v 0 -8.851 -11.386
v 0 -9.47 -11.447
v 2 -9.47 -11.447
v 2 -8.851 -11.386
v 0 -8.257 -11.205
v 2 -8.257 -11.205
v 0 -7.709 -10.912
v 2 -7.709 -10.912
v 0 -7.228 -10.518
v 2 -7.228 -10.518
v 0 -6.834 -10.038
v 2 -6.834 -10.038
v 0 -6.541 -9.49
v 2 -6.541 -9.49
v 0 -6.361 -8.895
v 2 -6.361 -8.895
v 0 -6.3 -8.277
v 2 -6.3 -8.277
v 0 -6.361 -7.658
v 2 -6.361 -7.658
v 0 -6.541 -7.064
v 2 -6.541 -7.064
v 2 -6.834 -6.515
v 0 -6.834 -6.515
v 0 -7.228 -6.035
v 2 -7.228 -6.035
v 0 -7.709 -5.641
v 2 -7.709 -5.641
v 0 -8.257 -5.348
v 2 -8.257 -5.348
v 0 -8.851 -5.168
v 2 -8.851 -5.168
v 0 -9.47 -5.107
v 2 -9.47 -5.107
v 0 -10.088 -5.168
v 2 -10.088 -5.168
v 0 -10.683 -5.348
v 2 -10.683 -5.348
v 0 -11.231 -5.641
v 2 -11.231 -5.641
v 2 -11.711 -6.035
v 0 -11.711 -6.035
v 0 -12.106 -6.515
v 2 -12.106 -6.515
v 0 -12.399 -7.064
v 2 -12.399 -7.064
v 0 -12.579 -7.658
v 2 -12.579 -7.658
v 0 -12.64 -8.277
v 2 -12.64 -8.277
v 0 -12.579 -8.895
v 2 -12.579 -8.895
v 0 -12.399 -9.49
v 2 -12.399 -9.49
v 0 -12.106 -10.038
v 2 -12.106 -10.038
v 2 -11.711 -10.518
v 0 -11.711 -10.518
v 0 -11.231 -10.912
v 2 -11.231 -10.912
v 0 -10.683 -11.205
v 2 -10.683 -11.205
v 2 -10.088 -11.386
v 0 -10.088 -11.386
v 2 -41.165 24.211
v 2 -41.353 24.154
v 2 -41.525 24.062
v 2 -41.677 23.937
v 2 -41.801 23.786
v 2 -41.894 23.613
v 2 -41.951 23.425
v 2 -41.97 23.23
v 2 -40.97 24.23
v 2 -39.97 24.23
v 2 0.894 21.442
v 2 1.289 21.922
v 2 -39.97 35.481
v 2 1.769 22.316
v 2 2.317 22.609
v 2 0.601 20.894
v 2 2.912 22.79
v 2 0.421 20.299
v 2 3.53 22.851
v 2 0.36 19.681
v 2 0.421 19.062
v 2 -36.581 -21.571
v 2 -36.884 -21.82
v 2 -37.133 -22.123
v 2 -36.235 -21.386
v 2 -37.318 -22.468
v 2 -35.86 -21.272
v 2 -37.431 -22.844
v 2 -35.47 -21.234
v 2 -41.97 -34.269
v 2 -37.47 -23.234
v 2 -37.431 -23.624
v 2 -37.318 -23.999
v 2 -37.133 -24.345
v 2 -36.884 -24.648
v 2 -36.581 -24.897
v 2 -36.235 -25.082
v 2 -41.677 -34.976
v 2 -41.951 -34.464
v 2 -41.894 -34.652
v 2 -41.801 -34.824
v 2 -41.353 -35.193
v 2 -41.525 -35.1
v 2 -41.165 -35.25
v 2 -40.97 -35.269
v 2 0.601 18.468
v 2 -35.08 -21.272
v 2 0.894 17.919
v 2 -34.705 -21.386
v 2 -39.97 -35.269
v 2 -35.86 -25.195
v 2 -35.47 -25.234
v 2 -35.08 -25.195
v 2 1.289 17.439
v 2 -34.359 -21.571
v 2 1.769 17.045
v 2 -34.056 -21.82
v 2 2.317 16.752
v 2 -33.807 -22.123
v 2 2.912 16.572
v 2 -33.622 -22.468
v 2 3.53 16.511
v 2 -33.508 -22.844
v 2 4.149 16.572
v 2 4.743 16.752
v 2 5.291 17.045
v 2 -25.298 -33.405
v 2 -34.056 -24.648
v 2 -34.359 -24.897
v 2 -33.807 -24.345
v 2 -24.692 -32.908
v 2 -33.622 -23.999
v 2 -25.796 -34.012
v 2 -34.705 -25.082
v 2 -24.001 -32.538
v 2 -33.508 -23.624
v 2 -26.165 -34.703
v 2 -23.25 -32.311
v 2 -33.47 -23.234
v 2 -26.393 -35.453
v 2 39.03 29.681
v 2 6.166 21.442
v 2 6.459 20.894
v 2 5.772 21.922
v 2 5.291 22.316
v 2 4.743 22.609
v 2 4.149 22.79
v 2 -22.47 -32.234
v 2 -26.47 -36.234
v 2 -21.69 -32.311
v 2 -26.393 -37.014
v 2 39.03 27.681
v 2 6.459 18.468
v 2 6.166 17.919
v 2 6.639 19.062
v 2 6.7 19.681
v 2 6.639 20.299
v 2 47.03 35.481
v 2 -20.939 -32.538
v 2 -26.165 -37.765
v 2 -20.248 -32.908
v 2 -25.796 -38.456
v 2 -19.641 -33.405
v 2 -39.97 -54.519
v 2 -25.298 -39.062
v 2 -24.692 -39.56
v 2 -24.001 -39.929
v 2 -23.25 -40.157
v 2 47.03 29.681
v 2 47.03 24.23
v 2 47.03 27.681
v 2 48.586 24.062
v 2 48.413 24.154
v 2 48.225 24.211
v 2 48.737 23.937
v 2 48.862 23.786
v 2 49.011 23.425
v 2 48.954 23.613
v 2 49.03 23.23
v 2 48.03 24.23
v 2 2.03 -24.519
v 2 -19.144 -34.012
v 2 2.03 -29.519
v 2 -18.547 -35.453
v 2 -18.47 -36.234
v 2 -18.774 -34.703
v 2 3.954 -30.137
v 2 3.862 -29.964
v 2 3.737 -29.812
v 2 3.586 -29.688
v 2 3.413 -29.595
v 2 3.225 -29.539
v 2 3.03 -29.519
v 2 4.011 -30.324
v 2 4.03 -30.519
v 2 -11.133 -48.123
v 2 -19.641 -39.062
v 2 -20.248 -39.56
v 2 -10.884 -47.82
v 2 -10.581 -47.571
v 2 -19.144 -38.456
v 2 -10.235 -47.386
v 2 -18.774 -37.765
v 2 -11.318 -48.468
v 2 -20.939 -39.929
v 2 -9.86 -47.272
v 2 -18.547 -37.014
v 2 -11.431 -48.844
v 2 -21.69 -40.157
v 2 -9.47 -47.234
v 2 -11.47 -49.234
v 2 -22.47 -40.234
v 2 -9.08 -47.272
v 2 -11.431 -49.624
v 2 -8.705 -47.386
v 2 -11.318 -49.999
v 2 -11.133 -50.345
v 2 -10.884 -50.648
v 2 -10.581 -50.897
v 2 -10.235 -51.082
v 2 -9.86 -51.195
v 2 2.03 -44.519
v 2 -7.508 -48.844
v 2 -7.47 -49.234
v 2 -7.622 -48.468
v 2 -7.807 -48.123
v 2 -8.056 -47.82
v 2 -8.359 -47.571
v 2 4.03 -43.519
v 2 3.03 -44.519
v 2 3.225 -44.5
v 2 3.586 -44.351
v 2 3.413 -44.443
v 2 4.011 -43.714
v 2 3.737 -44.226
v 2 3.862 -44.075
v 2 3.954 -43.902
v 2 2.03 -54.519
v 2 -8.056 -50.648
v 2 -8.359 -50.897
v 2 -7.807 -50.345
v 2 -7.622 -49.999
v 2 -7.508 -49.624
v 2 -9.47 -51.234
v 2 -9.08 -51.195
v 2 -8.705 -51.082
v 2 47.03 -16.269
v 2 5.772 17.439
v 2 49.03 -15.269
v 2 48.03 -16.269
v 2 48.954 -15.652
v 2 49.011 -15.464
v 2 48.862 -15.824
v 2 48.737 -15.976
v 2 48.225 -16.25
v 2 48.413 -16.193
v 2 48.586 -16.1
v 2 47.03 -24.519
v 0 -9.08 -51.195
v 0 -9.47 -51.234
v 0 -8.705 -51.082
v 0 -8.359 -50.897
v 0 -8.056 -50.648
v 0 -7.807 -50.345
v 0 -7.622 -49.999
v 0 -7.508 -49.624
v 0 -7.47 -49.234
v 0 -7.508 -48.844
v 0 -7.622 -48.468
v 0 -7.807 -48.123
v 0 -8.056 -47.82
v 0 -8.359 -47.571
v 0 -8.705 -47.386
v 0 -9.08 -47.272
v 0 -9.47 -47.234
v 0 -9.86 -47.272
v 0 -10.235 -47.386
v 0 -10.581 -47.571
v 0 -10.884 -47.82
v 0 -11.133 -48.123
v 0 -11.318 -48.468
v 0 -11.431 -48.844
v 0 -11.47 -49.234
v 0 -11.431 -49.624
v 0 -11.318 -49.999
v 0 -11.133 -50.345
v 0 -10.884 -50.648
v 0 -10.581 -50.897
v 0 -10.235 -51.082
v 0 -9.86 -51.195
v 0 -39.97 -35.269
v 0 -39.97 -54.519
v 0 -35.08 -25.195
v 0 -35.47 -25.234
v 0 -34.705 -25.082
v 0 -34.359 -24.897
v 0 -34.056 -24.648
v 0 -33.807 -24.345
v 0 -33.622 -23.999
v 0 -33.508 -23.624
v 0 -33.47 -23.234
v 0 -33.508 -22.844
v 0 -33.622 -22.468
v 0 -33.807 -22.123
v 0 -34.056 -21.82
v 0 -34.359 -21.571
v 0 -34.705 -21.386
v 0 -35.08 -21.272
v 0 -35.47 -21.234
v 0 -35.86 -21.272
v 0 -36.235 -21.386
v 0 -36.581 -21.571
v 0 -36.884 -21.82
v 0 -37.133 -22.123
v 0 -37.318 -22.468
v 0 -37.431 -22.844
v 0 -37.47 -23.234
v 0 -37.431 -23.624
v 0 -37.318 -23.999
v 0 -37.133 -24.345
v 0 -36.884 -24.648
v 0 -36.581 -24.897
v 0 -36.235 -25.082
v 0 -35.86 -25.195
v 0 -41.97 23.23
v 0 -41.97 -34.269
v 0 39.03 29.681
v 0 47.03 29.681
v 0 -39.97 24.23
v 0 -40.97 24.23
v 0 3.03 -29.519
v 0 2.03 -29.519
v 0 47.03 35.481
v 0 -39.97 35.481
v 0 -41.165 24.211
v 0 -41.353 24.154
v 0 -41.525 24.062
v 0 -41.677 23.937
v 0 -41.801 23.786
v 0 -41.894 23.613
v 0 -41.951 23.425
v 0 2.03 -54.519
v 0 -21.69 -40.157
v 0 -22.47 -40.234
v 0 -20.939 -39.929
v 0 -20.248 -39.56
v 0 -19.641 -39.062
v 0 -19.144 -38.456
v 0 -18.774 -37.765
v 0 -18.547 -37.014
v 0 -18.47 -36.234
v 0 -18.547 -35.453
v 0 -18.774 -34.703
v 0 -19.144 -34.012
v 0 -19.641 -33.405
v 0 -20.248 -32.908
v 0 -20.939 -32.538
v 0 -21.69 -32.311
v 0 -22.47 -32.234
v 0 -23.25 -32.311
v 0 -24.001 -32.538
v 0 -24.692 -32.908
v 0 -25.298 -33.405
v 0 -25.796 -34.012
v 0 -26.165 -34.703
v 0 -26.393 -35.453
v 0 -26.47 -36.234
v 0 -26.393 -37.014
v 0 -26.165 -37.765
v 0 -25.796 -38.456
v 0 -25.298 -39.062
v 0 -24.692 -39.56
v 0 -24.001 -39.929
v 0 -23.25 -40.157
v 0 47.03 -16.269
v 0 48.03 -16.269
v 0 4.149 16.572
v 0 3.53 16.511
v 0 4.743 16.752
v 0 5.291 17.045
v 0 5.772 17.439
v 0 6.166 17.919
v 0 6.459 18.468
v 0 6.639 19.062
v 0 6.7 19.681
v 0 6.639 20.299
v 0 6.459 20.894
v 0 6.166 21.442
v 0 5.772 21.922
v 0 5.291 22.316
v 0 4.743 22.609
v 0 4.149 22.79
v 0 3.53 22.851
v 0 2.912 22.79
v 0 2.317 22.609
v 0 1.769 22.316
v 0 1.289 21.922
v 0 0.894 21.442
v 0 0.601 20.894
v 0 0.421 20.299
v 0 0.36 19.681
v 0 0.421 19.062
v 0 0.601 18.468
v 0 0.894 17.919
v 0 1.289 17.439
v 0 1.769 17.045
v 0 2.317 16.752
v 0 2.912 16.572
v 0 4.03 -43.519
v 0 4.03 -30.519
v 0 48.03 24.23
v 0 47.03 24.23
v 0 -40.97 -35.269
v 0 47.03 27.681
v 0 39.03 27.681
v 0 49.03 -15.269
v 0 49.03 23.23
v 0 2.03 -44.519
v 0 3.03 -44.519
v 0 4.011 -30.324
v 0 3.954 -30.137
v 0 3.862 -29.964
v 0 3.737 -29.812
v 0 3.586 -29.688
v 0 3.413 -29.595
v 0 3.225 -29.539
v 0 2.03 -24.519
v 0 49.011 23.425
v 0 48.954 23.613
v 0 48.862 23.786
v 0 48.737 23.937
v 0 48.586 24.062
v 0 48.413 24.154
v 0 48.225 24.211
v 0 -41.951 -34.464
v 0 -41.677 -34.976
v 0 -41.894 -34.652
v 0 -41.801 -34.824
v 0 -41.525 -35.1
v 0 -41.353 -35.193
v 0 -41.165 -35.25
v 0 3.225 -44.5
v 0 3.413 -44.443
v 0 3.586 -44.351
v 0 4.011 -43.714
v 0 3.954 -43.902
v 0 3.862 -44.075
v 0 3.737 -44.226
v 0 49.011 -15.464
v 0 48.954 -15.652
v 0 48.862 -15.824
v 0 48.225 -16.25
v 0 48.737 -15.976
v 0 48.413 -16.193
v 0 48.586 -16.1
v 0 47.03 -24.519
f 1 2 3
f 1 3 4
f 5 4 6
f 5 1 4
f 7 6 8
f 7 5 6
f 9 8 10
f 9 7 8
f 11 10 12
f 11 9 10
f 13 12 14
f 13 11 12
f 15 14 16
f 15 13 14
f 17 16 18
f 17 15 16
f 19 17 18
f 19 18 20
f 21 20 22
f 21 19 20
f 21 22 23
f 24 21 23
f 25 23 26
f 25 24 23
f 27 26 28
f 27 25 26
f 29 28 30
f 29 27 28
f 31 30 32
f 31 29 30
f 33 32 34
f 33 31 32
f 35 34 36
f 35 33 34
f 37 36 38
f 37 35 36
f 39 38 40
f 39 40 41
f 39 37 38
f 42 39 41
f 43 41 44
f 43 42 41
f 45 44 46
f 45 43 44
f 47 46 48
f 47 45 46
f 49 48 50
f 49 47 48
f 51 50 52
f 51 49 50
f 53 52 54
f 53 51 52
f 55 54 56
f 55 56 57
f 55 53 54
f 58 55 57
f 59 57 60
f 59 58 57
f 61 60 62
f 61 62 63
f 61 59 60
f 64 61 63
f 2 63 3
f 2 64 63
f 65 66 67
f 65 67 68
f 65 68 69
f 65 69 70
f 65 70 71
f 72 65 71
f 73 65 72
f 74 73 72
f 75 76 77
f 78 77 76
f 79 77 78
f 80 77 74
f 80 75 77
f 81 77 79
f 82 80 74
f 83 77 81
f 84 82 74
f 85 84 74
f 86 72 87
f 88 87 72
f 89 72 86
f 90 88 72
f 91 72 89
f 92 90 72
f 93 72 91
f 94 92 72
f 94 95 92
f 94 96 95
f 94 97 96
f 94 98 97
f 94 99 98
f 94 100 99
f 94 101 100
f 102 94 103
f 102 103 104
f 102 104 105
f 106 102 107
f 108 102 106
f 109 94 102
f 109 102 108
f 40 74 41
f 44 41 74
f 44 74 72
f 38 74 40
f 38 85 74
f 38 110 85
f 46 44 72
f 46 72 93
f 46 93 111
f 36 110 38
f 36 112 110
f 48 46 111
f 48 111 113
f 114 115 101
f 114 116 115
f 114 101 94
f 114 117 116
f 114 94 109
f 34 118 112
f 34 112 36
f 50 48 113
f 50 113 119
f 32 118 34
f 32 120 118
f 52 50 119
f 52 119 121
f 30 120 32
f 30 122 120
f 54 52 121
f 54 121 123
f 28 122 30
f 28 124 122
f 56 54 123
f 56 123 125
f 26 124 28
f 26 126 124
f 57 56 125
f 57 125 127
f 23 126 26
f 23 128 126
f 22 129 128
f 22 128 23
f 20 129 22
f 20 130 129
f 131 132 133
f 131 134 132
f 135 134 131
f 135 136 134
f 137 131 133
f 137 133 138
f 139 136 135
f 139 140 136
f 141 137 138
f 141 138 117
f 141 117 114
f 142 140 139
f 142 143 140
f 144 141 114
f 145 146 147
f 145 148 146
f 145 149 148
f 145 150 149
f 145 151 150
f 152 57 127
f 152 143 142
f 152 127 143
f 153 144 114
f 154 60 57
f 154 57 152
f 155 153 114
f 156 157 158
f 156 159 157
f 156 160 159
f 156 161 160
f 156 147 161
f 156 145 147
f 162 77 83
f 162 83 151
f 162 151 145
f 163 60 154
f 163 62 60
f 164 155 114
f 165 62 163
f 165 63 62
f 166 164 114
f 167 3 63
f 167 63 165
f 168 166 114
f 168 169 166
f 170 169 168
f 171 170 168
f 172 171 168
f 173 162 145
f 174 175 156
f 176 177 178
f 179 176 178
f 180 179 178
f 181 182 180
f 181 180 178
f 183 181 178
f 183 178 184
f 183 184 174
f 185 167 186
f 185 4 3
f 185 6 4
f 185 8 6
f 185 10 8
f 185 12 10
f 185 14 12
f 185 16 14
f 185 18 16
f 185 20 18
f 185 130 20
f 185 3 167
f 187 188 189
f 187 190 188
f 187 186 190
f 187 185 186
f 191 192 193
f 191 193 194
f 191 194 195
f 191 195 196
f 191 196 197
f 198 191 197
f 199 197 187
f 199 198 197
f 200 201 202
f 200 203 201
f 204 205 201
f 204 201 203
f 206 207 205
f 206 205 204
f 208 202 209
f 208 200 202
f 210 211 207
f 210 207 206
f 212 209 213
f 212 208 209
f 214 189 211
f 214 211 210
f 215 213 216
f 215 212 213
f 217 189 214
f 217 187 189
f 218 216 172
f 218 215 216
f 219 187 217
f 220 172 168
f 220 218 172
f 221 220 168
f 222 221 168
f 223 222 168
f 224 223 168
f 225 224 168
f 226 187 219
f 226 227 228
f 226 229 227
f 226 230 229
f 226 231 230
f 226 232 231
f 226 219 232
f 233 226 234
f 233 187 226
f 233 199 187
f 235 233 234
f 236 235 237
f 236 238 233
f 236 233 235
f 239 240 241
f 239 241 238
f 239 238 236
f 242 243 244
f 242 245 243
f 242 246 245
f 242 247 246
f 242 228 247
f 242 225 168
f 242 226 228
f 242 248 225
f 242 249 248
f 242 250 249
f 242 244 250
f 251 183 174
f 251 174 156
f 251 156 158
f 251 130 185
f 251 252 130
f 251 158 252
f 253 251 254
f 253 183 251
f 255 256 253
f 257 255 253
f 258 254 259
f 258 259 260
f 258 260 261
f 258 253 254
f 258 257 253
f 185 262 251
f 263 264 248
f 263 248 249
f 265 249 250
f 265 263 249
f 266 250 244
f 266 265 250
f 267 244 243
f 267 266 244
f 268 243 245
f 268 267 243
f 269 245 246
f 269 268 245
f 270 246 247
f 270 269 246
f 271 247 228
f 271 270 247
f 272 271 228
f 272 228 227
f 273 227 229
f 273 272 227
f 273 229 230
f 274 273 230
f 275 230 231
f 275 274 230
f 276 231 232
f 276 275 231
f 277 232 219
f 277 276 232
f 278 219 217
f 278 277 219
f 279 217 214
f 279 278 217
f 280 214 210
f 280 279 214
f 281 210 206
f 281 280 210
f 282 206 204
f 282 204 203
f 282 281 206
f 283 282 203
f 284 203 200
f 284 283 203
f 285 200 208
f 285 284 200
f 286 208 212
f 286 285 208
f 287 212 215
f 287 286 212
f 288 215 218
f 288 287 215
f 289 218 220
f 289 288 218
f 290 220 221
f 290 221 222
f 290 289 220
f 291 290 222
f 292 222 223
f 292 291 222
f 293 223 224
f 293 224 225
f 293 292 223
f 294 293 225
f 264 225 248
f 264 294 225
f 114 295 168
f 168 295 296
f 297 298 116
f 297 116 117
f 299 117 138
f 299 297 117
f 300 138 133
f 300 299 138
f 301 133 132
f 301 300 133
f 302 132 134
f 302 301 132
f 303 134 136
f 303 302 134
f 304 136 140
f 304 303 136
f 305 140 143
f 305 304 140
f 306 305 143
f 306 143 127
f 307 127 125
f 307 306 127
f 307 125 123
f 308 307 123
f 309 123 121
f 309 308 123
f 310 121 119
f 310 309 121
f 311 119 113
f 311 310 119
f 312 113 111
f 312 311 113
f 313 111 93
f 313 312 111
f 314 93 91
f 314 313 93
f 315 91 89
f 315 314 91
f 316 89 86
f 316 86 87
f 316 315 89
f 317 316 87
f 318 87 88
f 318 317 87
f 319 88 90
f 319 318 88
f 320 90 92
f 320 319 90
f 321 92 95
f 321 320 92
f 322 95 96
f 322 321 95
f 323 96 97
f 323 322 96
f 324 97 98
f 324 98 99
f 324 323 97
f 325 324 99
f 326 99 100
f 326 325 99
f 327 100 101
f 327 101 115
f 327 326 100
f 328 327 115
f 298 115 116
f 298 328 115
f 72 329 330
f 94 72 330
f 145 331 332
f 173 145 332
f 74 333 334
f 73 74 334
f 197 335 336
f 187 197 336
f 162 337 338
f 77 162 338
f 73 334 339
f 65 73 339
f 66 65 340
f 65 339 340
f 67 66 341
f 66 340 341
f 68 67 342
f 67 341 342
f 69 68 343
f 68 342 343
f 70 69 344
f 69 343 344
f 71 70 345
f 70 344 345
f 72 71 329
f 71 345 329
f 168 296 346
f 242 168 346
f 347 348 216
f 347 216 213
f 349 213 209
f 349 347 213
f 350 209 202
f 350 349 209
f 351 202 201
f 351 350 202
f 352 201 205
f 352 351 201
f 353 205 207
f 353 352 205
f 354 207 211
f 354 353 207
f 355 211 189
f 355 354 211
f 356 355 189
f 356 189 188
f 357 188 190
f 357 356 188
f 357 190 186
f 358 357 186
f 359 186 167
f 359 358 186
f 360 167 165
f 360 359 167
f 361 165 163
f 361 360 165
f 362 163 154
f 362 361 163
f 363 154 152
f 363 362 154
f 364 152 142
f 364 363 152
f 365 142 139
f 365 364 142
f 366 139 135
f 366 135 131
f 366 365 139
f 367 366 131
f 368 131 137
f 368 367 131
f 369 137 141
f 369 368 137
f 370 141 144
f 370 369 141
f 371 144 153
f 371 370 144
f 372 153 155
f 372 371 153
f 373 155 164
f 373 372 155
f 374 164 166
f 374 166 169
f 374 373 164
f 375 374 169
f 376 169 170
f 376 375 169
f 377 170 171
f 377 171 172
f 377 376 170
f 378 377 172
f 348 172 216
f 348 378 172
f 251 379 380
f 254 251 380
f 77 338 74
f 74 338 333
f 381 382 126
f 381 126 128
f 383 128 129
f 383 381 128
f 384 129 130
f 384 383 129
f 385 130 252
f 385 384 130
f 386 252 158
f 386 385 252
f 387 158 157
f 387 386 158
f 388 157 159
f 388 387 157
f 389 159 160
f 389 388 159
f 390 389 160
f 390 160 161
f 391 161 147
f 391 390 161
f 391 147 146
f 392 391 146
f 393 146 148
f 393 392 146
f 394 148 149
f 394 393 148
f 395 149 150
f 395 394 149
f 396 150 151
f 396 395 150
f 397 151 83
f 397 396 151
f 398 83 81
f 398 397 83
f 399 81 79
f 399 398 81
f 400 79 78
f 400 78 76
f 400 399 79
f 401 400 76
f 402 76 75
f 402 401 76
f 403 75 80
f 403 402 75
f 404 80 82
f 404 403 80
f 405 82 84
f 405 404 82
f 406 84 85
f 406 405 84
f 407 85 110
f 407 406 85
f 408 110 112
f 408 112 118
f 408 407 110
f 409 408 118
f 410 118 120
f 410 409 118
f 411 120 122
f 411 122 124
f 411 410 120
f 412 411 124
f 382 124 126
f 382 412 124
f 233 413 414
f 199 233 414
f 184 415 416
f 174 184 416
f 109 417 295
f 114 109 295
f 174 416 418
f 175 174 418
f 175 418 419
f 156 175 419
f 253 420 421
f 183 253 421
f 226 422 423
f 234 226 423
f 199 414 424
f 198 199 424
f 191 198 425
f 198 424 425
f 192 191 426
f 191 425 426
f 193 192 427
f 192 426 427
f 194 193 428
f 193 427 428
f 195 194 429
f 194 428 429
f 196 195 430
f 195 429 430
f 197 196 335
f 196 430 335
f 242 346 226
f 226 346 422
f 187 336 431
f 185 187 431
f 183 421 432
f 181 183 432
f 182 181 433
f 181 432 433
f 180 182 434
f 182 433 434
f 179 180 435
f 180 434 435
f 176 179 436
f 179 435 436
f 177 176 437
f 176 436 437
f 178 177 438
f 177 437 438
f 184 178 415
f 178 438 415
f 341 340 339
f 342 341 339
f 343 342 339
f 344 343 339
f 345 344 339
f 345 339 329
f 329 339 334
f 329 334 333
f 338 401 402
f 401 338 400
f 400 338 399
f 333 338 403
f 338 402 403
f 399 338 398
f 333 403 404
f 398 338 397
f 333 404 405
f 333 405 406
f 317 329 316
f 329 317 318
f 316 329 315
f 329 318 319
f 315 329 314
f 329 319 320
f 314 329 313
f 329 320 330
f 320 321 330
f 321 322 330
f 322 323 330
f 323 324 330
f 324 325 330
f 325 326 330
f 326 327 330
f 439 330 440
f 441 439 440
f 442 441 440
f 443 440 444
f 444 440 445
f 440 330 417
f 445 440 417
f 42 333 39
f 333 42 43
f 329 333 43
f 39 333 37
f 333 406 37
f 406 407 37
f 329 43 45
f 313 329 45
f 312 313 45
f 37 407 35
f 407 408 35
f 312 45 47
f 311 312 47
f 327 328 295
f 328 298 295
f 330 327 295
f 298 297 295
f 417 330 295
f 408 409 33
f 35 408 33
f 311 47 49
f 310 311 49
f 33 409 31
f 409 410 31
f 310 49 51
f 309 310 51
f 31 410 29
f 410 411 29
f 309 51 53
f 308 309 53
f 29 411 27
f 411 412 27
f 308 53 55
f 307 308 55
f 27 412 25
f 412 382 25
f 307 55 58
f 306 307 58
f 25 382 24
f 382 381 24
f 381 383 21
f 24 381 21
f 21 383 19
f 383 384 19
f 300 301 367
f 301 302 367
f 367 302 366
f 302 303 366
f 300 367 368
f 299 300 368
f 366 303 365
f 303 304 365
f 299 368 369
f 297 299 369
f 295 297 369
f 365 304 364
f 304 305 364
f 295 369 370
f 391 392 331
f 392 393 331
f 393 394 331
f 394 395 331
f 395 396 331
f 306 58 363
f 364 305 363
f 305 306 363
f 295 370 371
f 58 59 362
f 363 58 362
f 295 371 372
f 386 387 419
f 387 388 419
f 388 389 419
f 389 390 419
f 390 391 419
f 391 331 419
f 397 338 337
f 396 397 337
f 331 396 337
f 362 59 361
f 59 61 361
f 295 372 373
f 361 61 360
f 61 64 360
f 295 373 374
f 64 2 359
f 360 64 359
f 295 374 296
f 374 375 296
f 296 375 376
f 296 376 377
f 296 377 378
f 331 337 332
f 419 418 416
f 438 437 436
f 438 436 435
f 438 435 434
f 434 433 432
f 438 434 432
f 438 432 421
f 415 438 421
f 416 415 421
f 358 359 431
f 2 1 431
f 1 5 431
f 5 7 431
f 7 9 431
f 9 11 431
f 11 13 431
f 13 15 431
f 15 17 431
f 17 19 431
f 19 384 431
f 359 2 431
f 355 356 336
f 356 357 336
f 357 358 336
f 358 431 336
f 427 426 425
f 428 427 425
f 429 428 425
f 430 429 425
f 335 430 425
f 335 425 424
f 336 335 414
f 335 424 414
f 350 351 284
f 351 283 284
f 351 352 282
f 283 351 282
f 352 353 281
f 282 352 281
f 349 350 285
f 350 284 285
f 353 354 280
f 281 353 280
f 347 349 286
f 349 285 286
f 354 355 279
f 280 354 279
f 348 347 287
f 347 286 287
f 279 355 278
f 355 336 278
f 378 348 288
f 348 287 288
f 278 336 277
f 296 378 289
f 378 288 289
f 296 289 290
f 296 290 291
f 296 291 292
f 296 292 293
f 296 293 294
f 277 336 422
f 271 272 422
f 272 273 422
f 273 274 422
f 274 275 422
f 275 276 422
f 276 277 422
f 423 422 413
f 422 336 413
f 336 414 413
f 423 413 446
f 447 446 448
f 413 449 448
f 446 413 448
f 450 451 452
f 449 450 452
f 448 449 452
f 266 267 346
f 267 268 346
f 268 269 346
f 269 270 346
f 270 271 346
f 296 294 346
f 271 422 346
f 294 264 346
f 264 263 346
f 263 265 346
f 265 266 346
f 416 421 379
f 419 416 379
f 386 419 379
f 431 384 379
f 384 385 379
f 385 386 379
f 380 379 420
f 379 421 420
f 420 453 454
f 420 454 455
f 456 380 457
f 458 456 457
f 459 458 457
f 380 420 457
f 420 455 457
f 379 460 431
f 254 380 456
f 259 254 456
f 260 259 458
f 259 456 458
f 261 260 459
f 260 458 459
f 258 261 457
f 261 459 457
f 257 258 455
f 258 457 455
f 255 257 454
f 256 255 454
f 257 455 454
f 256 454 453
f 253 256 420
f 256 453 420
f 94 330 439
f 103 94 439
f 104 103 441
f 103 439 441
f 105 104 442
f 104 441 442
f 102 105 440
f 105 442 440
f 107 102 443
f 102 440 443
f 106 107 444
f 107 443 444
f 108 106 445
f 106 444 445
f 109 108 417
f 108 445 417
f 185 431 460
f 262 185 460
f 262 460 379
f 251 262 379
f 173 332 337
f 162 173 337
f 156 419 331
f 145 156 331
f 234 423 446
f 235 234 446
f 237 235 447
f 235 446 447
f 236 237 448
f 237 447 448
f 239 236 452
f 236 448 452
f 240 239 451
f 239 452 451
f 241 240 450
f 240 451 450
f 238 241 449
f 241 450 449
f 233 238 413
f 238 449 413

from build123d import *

# Parameters (mm, degrees)
SKETCH1_R           = 4
SKETCH1_R_2         = 2
SKETCH1_R_3         = 3.17
BOSS_EXTRUDE1_DEPTH = 2


with BuildPart() as part:
    # Sketch1 → Boss-Extrude1 (new body)
    with BuildSketch(Plane(origin=(0, 0, 0), x_dir=(0, 0, -1), z_dir=(1, 0, 0))):
        with BuildLine():
            Line((54.519367594, -39.969907591), (54.519367594, 2.030092409))
            Line((54.519367594, 2.030092409), (44.519367594, 2.030092409))
            Line((44.519367594, 2.030092409), (44.519367594, 3.030092409))
            ThreePointArc((44.519367594, 3.030092409), (44.226474376, 3.73719919), (43.519367594, 4.030092409))
            Line((43.519367594, 4.030092409), (30.519367594, 4.030092409))
            ThreePointArc((30.519367594, 4.030092409), (29.812260813, 3.73719919), (29.519367594, 3.030092409))
            Line((29.519367594, 3.030092409), (29.519367594, 2.030092409))
            Line((29.519367594, 2.030092409), (24.519367594, 2.030092409))
            Line((24.519367594, 2.030092409), (24.519367594, 47.030092409))
            Line((24.519367594, 47.030092409), (16.268858723, 47.030092409))
            Line((16.268858723, 47.030092409), (16.268858723, 48.030092409))
            ThreePointArc((16.268858723, 48.030092409), (15.975965504, 48.73719919), (15.268858723, 49.030092409))
            Line((15.268858723, 49.030092409), (-23.230123534, 49.030092409))
            ThreePointArc((-23.230123534, 49.030092409), (-23.937230315, 48.73719919), (-24.230123534, 48.030092409))
            Line((-24.230123534, 48.030092409), (-24.230123534, 47.030092409))
            Line((-24.230123534, 47.030092409), (-27.680632406, 47.030092409))
            Line((-27.680632406, 47.030092409), (-27.680632406, 39.030092409))
            Line((-27.680632406, 39.030092409), (-29.680632406, 39.030092409))
            Line((-29.680632406, 39.030092409), (-29.680632406, 47.030092409))
            Line((-29.680632406, 47.030092409), (-35.480632406, 47.030092409))
            Line((-35.480632406, 47.030092409), (-35.480632406, -39.969907591))
            Line((-35.480632406, -39.969907591), (-24.230123534, -39.969907591))
            Line((-24.230123534, -39.969907591), (-24.230123534, -40.969907591))
            ThreePointArc((-24.230123534, -40.969907591), (-23.937230315, -41.677014372), (-23.230123534, -41.969907591))
            Line((-23.230123534, -41.969907591), (34.268858723, -41.969907591))
            ThreePointArc((34.268858723, -41.969907591), (34.975965504, -41.677014372), (35.268858723, -40.969907591))
            Line((35.268858723, -40.969907591), (35.268858723, -39.969907591))
            Line((35.268858723, -39.969907591), (54.519367594, -39.969907591))
        make_face()
        with Locations((36.233846968, -22.469907591)):
            Circle(SKETCH1_R, mode=Mode.SUBTRACT)
        with Locations((49.233846968, -9.469907591)):
            Circle(SKETCH1_R_2, mode=Mode.SUBTRACT)
        with Locations((23.233846968, -35.469907591)):
            Circle(SKETCH1_R_2, mode=Mode.SUBTRACT)
        with Locations((-19.680632406, 3.530092409)):
            Circle(SKETCH1_R_3, mode=Mode.SUBTRACT)
        with Locations((8.276607281, -9.469907591)):
            Circle(SKETCH1_R_3, mode=Mode.SUBTRACT)
    extrude(amount=BOSS_EXTRUDE1_DEPTH)


solid = part.part
